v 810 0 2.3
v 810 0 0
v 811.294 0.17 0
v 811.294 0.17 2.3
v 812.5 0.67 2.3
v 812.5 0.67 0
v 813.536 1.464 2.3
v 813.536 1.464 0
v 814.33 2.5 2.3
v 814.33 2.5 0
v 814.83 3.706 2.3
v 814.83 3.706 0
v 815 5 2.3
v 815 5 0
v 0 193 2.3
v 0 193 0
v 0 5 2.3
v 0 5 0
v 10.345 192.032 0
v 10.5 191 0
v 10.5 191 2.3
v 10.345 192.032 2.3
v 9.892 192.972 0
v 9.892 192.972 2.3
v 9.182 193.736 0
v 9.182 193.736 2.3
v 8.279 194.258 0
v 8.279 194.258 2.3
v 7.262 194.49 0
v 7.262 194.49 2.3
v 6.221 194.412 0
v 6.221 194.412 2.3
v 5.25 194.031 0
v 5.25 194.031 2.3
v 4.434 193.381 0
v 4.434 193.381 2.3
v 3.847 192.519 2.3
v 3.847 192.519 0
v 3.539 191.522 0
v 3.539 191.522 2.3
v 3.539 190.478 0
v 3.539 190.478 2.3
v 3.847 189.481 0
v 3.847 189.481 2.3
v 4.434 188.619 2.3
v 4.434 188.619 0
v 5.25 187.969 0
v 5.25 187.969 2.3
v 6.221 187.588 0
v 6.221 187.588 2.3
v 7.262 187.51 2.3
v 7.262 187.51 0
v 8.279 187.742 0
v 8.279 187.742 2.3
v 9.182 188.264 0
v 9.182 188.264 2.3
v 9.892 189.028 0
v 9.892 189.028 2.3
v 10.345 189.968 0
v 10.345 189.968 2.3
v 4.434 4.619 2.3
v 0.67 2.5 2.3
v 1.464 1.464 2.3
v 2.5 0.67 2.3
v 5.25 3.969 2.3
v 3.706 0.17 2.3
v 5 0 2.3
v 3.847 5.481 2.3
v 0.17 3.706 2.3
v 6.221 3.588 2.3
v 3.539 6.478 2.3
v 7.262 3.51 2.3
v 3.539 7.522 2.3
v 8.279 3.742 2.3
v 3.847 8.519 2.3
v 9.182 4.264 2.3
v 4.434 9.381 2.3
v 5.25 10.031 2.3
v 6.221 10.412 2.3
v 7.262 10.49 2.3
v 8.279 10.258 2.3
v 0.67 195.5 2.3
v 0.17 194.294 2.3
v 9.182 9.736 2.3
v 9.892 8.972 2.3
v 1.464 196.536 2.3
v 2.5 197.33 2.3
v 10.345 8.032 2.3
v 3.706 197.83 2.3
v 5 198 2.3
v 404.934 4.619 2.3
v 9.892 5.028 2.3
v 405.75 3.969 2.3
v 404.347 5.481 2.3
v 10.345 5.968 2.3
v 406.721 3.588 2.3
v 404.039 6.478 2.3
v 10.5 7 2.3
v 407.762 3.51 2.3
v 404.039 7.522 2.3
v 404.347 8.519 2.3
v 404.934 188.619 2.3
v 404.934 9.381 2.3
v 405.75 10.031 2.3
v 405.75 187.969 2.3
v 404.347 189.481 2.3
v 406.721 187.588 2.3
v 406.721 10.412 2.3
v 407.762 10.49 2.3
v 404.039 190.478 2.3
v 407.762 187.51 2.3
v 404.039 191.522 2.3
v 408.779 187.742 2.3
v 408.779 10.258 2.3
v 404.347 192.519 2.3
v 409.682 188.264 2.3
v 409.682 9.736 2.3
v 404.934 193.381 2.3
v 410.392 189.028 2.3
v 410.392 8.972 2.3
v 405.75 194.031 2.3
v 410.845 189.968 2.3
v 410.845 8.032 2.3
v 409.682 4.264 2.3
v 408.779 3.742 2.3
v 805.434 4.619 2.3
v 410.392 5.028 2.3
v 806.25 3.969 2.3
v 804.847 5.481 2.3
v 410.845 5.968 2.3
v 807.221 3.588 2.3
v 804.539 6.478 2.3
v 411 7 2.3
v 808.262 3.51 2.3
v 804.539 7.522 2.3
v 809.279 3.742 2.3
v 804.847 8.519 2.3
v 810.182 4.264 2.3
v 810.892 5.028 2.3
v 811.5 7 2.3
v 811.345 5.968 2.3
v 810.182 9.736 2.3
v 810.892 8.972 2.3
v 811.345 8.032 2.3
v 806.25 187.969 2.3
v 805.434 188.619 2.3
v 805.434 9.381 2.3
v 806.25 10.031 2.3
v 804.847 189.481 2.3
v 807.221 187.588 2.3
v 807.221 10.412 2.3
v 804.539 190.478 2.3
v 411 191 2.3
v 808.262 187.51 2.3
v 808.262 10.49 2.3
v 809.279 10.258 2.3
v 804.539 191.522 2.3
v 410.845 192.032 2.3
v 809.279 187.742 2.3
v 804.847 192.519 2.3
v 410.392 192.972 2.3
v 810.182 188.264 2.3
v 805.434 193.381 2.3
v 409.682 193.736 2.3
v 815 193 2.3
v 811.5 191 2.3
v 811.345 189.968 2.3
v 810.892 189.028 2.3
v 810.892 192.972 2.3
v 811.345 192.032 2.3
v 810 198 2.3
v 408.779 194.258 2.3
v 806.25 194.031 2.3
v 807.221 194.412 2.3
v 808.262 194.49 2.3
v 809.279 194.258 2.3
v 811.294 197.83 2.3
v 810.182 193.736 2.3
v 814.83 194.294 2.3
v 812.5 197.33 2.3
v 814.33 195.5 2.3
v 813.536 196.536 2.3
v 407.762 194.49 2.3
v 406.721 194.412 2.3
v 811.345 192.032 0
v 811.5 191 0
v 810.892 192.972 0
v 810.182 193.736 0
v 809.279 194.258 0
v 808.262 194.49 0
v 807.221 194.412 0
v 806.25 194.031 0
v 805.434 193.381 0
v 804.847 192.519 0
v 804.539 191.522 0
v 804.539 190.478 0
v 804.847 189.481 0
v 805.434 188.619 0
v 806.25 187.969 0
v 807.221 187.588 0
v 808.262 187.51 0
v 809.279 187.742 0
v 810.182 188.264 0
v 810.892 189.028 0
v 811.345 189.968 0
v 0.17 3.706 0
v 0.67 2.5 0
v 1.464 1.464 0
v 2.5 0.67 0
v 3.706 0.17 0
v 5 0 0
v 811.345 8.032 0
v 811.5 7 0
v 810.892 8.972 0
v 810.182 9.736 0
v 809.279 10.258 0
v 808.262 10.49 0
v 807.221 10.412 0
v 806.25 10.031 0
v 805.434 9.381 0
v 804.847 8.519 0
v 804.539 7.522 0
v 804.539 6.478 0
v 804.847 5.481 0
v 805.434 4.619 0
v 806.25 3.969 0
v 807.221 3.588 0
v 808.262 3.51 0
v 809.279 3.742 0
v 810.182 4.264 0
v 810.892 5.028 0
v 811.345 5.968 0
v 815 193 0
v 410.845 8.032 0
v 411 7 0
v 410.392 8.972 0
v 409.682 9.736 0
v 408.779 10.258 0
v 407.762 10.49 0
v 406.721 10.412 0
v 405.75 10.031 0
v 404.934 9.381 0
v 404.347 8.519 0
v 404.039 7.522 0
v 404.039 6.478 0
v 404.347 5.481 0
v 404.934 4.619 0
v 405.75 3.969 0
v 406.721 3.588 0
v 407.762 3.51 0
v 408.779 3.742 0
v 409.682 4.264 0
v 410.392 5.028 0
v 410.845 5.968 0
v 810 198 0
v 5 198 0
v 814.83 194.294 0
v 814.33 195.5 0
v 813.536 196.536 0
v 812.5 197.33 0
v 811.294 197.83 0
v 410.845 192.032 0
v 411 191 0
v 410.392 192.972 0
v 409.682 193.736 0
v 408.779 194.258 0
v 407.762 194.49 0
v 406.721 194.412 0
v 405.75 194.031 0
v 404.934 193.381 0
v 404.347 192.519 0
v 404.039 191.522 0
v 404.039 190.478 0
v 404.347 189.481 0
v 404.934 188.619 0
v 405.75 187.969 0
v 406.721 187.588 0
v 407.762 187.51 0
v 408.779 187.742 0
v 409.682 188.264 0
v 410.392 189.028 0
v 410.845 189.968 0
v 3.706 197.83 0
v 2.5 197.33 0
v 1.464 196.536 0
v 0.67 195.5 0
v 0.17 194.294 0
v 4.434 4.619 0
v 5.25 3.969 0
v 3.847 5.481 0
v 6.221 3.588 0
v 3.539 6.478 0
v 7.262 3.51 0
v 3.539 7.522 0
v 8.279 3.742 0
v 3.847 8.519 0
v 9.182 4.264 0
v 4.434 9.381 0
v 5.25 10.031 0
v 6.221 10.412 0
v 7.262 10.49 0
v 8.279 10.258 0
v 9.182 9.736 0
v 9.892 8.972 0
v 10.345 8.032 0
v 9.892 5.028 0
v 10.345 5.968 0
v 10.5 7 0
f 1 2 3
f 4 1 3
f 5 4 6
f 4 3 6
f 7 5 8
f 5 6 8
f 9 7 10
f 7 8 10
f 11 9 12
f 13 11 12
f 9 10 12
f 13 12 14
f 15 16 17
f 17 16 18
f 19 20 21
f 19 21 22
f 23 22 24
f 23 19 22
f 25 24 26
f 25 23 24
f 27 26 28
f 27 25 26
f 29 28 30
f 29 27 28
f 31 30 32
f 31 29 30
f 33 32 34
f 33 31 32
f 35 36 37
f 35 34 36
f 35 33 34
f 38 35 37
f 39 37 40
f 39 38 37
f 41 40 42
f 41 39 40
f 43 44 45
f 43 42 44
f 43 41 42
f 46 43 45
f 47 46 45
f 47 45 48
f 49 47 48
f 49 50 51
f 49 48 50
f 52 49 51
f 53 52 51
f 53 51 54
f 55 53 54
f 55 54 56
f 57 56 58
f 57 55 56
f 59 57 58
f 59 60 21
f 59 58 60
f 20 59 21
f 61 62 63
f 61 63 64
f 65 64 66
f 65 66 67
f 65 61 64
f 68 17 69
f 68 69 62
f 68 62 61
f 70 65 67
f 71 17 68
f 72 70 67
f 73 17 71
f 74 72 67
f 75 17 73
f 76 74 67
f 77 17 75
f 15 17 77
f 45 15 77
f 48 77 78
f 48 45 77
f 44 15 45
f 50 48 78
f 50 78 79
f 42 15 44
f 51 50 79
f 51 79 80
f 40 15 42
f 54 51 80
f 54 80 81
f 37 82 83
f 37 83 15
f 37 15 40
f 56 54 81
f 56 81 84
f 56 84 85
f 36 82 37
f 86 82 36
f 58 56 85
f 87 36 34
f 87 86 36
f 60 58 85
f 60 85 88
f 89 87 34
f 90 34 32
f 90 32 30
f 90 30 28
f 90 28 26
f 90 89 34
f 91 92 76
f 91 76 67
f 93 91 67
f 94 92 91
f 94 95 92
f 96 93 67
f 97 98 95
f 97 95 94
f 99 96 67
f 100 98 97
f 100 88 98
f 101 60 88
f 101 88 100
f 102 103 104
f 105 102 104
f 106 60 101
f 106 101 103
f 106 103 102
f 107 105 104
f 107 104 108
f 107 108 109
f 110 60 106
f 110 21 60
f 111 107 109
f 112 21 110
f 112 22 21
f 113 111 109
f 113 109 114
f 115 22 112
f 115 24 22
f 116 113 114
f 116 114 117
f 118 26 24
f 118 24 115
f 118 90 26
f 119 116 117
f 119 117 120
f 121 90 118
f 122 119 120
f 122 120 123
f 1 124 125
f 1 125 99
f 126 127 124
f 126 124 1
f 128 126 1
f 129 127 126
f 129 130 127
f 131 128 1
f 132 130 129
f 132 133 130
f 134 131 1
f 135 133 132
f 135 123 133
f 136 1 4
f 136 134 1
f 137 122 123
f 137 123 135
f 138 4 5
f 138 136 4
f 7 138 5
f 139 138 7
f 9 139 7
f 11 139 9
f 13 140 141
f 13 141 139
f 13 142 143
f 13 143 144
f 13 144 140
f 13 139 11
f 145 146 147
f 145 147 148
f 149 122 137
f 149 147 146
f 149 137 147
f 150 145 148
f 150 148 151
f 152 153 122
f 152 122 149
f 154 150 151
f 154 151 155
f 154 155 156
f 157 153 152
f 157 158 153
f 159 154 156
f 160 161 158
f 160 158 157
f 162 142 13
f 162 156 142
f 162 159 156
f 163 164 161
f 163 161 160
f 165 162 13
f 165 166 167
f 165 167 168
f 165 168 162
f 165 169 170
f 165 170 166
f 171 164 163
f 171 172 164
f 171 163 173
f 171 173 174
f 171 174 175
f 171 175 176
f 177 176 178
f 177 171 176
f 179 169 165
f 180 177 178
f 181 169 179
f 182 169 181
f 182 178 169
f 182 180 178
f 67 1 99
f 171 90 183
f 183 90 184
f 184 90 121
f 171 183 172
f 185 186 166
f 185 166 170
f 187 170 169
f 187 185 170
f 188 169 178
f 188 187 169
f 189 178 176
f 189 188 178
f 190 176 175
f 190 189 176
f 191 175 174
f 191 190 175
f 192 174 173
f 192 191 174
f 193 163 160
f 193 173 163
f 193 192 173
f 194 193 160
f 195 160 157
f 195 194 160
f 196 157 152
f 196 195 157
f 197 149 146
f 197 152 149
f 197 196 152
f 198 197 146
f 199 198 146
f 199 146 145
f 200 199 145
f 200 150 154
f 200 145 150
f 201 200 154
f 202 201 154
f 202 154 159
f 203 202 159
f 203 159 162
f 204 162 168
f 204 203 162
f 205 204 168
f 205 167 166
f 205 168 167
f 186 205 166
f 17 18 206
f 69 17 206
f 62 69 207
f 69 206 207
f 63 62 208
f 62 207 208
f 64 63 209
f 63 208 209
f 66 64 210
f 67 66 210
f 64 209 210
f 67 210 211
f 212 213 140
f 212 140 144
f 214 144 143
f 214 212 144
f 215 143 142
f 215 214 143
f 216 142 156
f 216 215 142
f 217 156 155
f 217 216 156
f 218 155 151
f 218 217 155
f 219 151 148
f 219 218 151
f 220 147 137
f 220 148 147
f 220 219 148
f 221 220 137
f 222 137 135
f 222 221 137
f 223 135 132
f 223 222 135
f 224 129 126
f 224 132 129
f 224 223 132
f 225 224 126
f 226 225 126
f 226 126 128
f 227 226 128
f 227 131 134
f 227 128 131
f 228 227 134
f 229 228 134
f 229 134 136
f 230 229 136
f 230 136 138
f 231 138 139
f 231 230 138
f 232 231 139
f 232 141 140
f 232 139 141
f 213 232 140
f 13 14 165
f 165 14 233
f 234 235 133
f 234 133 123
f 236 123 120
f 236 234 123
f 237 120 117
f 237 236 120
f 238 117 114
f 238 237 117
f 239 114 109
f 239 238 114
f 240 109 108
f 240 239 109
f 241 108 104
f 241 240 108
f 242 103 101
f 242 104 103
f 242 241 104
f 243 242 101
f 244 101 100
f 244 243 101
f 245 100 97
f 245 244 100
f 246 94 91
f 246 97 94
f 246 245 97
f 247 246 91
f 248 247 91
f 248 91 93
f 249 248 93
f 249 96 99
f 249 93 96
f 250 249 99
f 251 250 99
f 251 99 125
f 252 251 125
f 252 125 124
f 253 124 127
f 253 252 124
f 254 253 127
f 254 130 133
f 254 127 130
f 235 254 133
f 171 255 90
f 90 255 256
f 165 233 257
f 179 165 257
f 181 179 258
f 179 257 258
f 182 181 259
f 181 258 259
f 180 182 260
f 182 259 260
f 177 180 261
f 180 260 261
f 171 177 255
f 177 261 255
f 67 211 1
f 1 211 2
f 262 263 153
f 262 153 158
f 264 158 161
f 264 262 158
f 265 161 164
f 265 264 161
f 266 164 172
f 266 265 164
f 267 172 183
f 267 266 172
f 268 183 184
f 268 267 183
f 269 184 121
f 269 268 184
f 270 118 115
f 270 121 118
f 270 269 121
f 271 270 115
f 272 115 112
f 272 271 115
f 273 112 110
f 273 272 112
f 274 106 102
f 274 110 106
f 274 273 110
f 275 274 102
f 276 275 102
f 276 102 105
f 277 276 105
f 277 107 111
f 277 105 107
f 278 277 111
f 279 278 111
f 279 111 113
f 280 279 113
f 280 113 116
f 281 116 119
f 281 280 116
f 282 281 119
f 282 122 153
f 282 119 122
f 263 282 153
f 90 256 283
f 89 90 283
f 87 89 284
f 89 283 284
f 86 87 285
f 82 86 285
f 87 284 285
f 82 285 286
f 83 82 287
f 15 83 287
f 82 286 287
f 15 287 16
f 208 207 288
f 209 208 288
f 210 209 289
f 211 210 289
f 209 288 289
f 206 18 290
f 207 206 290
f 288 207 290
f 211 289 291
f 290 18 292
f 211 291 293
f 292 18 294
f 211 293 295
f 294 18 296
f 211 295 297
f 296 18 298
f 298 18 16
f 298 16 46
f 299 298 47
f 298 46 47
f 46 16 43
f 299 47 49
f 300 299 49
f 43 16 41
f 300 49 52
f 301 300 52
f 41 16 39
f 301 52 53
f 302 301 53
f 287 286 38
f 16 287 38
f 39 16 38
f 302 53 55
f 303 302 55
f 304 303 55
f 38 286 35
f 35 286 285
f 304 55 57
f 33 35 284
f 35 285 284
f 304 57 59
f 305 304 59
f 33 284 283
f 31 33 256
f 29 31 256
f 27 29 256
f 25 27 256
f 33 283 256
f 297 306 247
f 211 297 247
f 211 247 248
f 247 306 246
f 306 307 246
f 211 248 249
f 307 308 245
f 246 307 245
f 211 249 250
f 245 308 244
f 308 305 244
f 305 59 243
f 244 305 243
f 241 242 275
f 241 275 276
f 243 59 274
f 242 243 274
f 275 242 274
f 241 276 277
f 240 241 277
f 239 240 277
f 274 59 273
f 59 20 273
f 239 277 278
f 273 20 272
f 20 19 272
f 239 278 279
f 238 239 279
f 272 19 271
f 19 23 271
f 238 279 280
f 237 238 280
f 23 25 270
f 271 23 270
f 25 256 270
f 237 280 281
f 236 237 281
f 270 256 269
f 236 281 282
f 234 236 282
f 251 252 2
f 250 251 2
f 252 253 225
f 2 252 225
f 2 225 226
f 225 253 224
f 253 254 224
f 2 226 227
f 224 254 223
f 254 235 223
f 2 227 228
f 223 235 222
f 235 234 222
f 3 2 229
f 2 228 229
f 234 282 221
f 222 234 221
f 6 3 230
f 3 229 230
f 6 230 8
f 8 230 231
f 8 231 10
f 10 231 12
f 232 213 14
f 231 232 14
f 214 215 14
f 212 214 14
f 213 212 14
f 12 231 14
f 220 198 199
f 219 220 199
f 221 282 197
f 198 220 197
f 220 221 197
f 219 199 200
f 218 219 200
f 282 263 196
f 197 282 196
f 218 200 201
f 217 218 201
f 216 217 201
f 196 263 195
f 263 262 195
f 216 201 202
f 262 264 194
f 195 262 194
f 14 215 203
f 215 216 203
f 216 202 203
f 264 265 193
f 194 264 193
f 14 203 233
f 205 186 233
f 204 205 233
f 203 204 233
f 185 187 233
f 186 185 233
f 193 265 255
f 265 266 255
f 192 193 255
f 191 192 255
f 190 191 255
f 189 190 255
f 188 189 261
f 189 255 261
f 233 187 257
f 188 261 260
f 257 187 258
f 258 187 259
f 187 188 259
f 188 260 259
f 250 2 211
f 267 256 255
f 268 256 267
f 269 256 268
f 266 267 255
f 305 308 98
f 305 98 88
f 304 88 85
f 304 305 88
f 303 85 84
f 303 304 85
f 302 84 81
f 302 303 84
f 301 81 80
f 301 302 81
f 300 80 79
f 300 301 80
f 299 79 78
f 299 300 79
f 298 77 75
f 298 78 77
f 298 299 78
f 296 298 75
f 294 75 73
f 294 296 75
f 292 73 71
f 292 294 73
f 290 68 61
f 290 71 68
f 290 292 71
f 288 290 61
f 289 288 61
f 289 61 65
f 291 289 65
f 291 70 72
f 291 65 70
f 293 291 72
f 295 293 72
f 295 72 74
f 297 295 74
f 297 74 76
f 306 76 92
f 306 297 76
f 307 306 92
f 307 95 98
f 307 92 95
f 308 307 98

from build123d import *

# Parameters (mm, degrees)
EXTRUDE_1_DEPTH          = 2.3
CUT_EXTRUDE_1_DEPTH      = 839.70989621
CUT_EXTRUDE_1_DEPTH_BACK = 839.70989621
SKETCH_2_R               = 3.5


with BuildPart() as part:
    # ｽｹｯﾁ1 → ﾎﾞｽ - 押し出し1 (new body)
    with BuildSketch(Plane.XY):
        with BuildLine():
            Line((5, 0), (810, 0))
            ThreePointArc((810, 0), (813.535533906, 1.464466094), (815, 5))
            Line((815, 5), (815, 193))
            ThreePointArc((815, 193), (813.535533906, 196.535533906), (810, 198))
            Line((810, 198), (5, 198))
            ThreePointArc((5, 198), (1.464466094, 196.535533906), (0, 193))
            Line((0, 193), (0, 5))
            ThreePointArc((0, 5), (1.464466094, 1.464466094), (5, 0))
        make_face()
    extrude(amount=EXTRUDE_1_DEPTH)

    # ｽｹｯﾁ2 → ｶｯﾄ - 押し出し1 (cut, two sides: drawn at the far end of the back side and taken through both)
    with BuildSketch(Plane.XY.offset(-CUT_EXTRUDE_1_DEPTH_BACK)):
        with Locations((7, 7)):
            Circle(SKETCH_2_R)
        with Locations((7, 191)):
            Circle(SKETCH_2_R)
        with Locations((407.5, 7)):
            Circle(SKETCH_2_R)
        with Locations((407.5, 191)):
            Circle(SKETCH_2_R)
        with Locations((808, 7)):
            Circle(SKETCH_2_R)
        with Locations((808, 191)):
            Circle(SKETCH_2_R)
    extrude(amount=CUT_EXTRUDE_1_DEPTH + CUT_EXTRUDE_1_DEPTH_BACK, mode=Mode.SUBTRACT)


solid = part.part
